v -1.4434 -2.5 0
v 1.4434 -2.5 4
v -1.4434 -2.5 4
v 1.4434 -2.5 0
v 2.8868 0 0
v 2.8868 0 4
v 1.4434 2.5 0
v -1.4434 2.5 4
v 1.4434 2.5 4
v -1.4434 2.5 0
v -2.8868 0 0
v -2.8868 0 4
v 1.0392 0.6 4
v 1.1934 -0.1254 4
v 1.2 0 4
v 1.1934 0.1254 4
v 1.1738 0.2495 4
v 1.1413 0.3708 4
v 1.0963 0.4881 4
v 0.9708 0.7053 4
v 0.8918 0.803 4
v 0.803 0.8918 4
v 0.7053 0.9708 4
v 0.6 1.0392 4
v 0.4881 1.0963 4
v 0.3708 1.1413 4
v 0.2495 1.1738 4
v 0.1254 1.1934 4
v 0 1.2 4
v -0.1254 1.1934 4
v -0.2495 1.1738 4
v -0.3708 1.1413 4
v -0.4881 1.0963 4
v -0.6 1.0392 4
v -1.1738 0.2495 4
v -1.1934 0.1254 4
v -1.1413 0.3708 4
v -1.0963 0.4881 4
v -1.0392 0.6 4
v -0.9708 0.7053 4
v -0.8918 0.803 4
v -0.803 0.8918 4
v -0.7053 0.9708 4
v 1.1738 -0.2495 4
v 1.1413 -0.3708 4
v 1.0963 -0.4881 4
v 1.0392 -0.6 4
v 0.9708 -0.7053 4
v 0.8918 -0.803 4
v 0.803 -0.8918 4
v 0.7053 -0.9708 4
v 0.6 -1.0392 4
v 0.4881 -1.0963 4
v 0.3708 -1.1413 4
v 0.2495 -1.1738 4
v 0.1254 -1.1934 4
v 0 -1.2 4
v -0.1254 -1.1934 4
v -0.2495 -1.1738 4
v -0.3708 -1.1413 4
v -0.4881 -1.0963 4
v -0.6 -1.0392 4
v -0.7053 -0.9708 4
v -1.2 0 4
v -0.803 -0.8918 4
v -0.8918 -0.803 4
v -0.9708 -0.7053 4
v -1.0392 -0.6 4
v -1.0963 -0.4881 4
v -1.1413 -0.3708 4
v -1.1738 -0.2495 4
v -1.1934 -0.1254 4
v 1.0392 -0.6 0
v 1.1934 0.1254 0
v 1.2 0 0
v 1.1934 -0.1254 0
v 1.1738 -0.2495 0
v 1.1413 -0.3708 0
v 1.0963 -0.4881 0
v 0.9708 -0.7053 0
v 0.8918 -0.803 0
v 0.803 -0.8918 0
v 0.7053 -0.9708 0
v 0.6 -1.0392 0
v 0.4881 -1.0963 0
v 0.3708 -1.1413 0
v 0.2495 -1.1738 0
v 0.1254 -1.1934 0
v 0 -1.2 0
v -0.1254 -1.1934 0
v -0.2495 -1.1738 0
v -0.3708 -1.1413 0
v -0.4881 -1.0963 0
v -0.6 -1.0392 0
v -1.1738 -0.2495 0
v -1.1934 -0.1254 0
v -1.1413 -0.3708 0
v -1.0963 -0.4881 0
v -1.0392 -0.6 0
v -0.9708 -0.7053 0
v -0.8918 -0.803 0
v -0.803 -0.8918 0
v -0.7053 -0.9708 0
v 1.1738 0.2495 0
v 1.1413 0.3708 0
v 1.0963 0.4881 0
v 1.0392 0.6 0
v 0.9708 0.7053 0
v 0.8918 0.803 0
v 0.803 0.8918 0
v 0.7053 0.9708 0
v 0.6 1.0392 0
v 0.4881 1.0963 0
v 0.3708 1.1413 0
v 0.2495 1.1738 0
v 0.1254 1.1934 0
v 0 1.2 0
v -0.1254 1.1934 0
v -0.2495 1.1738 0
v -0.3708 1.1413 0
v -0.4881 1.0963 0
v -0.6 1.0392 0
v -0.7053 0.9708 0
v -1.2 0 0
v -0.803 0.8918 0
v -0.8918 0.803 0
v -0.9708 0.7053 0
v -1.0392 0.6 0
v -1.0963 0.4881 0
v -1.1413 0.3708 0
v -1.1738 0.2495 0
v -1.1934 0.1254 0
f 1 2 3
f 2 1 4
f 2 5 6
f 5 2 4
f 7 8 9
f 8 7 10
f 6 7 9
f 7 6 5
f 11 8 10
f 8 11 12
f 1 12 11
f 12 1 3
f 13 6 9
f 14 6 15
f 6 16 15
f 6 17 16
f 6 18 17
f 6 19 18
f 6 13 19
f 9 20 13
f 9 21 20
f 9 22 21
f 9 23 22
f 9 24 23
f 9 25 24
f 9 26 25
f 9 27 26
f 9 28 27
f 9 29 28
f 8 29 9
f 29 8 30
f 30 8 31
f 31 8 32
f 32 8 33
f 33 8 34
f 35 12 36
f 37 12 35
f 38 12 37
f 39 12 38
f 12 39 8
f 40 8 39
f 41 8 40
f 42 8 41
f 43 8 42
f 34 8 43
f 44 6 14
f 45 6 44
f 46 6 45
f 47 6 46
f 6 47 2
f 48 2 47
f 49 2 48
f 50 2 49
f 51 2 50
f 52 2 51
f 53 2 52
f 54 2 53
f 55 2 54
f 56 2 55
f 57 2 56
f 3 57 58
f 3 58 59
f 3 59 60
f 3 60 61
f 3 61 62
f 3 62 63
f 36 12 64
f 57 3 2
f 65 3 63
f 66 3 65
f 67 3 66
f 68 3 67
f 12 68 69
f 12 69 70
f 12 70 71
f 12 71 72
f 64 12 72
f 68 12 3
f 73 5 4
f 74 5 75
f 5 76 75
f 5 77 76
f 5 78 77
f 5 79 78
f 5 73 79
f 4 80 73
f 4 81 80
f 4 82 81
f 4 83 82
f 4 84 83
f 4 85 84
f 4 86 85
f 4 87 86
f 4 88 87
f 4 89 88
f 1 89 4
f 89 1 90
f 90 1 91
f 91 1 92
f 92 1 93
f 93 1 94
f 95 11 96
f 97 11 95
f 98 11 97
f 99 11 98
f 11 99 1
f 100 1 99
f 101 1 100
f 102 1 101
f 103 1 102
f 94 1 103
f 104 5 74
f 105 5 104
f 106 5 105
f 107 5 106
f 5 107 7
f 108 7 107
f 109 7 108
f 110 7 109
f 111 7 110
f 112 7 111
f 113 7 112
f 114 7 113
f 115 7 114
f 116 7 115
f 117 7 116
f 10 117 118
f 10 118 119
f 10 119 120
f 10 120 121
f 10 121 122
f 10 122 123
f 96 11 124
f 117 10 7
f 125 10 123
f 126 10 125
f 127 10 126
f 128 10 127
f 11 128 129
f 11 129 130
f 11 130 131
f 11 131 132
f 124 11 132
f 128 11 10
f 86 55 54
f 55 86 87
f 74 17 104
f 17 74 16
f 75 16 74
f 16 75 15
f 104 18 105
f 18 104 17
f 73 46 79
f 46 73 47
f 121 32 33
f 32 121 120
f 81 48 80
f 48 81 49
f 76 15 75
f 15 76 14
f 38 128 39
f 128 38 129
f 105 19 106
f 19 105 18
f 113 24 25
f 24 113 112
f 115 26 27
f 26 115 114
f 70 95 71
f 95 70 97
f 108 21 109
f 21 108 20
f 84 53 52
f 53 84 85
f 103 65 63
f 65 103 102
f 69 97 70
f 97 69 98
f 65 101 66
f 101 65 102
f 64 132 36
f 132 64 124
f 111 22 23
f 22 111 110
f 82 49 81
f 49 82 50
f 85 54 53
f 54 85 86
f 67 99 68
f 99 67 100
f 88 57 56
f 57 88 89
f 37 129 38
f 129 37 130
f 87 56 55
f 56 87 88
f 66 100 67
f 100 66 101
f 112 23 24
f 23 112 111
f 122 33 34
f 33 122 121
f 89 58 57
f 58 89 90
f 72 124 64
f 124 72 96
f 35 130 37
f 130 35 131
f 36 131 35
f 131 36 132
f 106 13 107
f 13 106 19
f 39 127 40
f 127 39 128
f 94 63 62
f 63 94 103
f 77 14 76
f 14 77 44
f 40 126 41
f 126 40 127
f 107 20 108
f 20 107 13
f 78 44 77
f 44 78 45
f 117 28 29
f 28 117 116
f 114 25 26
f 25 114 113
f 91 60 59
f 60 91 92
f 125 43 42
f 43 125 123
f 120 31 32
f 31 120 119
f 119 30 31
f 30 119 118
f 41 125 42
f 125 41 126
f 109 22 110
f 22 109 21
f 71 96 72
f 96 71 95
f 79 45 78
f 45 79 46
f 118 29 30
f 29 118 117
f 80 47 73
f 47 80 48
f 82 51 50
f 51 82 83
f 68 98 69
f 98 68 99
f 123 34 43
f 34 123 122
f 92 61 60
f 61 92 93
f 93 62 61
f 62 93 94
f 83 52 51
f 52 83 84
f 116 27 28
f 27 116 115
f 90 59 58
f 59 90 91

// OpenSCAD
// Hex spacer.
$fn = 60;
eps = 0.02;
inner_d = 2.4;
flat = 5;
length = 4;
difference() { cylinder(d=flat/cos(30),h=length,$fn=6); translate([0,0,-eps]) cylinder(d=inner_d,h=length+2*eps); }
